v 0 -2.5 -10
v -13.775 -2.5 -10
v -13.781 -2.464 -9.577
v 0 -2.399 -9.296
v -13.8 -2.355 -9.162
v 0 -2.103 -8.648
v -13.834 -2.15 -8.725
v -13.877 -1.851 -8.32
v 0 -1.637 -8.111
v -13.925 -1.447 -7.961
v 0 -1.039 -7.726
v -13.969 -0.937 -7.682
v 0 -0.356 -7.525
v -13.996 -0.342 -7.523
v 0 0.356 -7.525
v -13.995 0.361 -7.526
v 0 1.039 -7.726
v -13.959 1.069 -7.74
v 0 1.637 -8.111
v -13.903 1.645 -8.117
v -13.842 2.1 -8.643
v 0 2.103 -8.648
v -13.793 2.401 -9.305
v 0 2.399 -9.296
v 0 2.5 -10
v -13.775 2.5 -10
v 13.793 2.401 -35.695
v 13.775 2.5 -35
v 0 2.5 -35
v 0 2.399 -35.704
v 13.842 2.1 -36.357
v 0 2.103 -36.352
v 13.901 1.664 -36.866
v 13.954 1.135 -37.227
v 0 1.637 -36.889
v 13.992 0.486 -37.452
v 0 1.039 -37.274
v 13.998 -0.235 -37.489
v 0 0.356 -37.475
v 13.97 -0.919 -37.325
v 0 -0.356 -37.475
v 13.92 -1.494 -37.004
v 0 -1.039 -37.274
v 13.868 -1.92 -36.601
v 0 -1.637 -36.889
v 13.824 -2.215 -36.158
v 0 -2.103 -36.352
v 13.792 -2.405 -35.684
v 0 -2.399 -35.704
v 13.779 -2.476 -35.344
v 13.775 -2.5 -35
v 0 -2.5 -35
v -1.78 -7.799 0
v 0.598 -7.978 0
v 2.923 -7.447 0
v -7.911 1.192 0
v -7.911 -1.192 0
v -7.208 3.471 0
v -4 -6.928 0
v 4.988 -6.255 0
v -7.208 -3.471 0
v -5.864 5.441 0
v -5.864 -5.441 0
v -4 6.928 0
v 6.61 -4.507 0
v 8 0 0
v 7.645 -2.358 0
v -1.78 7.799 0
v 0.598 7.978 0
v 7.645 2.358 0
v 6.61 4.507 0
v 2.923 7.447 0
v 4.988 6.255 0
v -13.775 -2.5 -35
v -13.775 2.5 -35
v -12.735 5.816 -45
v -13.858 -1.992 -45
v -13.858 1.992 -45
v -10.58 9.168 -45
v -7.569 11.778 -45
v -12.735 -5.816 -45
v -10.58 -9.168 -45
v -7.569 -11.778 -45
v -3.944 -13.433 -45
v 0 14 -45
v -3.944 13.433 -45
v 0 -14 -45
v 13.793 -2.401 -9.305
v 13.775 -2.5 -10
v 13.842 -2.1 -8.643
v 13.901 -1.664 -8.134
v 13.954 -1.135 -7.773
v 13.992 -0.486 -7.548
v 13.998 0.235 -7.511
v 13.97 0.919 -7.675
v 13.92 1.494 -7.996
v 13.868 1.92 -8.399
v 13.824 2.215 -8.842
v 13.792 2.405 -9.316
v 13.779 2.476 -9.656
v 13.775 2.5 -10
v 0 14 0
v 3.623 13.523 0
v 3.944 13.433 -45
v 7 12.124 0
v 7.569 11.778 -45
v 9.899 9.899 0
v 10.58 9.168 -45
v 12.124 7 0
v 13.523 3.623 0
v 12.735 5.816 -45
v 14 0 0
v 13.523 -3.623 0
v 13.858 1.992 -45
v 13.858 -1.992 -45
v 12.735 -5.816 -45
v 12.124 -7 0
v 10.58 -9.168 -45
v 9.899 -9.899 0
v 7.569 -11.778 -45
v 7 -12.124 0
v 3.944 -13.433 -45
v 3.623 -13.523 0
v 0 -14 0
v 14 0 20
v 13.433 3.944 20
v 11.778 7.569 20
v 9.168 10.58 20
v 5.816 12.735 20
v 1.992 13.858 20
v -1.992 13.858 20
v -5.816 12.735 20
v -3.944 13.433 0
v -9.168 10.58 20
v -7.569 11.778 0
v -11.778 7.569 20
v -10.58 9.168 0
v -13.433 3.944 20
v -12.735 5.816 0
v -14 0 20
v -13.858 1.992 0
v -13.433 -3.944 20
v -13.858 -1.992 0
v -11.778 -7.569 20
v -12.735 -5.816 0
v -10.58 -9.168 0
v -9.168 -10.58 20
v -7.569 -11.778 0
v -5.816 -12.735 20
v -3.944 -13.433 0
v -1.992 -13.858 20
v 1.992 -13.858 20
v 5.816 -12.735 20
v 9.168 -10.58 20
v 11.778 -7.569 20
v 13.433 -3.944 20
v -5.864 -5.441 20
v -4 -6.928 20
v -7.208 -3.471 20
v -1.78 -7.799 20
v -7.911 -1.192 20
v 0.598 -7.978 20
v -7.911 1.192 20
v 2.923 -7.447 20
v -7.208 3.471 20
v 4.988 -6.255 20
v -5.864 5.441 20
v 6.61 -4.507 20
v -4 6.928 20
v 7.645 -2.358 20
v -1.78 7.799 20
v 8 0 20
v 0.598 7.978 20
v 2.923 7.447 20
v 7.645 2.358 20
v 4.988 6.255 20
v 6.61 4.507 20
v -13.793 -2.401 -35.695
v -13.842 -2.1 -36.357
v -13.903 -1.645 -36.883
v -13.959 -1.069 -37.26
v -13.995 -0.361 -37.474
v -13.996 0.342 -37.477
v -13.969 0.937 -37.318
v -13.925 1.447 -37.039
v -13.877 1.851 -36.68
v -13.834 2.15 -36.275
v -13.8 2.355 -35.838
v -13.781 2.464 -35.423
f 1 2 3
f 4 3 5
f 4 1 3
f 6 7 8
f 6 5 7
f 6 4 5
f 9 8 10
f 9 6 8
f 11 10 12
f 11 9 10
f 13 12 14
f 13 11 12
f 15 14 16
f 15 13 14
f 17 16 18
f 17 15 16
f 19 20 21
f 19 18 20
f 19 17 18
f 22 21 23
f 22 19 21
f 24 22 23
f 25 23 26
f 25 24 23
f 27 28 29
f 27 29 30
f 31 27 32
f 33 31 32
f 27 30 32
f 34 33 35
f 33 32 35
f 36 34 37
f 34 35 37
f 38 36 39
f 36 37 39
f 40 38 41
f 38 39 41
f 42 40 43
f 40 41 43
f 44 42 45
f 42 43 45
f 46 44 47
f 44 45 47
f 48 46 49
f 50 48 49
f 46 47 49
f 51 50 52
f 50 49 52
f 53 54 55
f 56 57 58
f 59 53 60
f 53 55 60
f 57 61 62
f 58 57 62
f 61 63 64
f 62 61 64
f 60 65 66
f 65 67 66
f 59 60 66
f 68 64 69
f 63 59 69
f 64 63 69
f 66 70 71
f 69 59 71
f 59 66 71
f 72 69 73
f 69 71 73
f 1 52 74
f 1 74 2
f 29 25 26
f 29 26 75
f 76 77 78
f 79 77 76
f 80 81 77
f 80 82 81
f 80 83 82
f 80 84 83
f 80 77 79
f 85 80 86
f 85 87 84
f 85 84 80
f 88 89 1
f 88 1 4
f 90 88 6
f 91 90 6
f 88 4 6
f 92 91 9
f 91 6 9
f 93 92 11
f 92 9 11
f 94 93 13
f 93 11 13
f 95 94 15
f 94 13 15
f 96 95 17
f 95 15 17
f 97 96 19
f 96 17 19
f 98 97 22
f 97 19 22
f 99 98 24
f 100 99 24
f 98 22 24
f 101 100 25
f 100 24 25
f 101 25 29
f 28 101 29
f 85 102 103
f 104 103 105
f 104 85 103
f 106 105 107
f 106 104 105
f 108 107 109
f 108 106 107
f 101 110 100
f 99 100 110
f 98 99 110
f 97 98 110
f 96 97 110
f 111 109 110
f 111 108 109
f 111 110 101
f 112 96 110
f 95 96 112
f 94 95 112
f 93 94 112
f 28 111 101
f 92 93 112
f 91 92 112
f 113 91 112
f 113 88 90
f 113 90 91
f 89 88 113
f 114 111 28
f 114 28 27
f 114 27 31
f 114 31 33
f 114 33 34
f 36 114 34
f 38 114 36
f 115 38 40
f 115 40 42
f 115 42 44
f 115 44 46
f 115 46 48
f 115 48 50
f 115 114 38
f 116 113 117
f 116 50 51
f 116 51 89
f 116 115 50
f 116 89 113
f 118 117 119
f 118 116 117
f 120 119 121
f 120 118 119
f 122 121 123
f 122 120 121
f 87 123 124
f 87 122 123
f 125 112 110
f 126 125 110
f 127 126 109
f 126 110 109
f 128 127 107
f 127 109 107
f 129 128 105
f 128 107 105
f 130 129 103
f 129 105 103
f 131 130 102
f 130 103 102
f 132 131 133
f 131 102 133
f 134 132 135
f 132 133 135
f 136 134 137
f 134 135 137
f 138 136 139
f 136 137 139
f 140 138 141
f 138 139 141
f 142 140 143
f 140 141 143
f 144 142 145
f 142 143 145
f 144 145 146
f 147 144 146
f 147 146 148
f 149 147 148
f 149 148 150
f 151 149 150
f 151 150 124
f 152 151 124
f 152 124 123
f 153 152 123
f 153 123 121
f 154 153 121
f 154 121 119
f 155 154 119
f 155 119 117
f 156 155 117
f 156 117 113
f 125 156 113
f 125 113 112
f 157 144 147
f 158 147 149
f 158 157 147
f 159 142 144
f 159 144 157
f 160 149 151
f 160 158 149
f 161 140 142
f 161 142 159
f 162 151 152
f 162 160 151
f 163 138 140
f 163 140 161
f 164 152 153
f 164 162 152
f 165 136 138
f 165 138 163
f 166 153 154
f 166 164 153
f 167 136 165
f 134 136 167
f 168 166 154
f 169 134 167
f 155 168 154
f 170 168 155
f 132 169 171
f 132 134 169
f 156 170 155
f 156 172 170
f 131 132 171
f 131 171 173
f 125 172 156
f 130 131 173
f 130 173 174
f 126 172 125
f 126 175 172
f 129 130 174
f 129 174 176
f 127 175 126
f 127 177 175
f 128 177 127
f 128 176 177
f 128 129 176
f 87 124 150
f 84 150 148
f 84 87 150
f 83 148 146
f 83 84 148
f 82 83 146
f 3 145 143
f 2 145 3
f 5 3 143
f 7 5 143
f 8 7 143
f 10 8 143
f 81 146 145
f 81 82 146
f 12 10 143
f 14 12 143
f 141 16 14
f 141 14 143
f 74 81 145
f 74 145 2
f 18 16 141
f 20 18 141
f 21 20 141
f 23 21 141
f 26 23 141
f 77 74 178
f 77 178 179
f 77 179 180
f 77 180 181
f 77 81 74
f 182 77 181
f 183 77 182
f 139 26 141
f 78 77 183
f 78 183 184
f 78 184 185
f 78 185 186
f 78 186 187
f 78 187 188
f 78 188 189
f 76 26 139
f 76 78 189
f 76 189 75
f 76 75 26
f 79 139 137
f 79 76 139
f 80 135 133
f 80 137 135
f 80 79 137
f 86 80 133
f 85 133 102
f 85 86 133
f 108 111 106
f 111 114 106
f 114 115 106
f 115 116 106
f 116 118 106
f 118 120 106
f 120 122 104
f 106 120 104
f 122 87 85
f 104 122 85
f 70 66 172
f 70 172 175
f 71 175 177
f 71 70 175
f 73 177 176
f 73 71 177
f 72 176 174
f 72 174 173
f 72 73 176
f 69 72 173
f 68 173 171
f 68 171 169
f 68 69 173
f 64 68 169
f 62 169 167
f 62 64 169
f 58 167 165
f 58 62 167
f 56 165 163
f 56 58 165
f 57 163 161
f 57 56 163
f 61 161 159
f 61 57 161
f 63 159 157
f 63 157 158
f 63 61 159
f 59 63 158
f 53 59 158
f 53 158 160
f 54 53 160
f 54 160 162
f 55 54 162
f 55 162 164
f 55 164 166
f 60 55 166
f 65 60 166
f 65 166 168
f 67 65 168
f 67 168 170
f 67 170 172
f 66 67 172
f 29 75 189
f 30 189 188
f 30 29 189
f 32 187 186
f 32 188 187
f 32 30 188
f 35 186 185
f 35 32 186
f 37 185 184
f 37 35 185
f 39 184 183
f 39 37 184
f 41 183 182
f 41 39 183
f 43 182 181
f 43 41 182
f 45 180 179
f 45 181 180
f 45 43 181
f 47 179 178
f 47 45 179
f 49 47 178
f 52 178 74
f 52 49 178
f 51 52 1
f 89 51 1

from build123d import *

# Parameters (mm, degrees)
SCHIZZO1_R                                    = 14
SCHIZZO1_R_2                                  = 8
ESTRUSIONE_ESTRUSIONE1_DEPTH                  = 20
ESTRUSIONE_ESTRUSIONE2_REACH                  = 30.142
ESTRUSIONE_ESTRUSIONE2_END_RADIUS             = 14
SCHIZZO2_W                                    = 45
SCHIZZO2_H                                    = 28
ESTRUSIONE_ESTRUSIONE2_DIRECTION_2_REACH      = 30.142
ESTRUSIONE_ESTRUSIONE2_DIRECTION_2_END_RADIUS = 14


with BuildPart() as part:
    # Schizzo1 → Estrusione-Estrusione1 (new body)
    with BuildSketch(Plane.XY):
        Circle(SCHIZZO1_R)
        Circle(SCHIZZO1_R_2, mode=Mode.SUBTRACT)
    extrude(amount=ESTRUSIONE_ESTRUSIONE1_DEPTH)

    # Estrusione-Estrusione2: up to this cylinder (the profile starts inside it)
    estrusione_estrusione2_end = Plane(origin=(0, 0, -22.5), z_dir=(0, 0, -1)) * Cylinder(ESTRUSIONE_ESTRUSIONE2_END_RADIUS, 89.284, mode=Mode.PRIVATE)
    # Schizzo2 → Estrusione-Estrusione2 (add, up to the surface)
    with BuildSketch(Plane(origin=(0, 0, 0), x_dir=(0, 0, -1), z_dir=(1, 0, 0)), mode=Mode.PRIVATE) as estrusione_estrusione2_sk1:
        with Locations((22.5, 0)):
            Rectangle(SCHIZZO2_W, SCHIZZO2_H)
        with BuildLine():
            Line((35, -2.5), (10, -2.5))
            ThreePointArc((10, -2.5), (7.5, 0), (10, 2.5))
            Line((10, 2.5), (35, 2.5))
            ThreePointArc((35, 2.5), (37.5, 0), (35, -2.5))
        make_face(mode=Mode.SUBTRACT)
    estrusione_estrusione2_tool1 = extrude(estrusione_estrusione2_sk1.sketch, amount=ESTRUSIONE_ESTRUSIONE2_REACH, mode=Mode.PRIVATE) & estrusione_estrusione2_end
    add(estrusione_estrusione2_tool1.solids().sort_by_distance((0, -13.47, -22.5))[0])

    # Estrusione-Estrusione2 direction 2: up to this cylinder (the profile starts inside it)
    estrusione_estrusione2_direction_2_end = Plane(origin=(0, 0, -22.5), z_dir=(0, 0, -1)) * Cylinder(ESTRUSIONE_ESTRUSIONE2_DIRECTION_2_END_RADIUS, 89.284, mode=Mode.PRIVATE)
    # Schizzo2 → Estrusione-Estrusione2 direction 2 (add, up to the surface)
    with BuildSketch(Plane(origin=(0, 0, 0), x_dir=(0, 0, -1), z_dir=(1, 0, 0)), mode=Mode.PRIVATE) as estrusione_estrusione2_direction_2_sk1:
        with Locations((22.5, 0)):
            Rectangle(SCHIZZO2_W, SCHIZZO2_H)
        with BuildLine():
            Line((35, -2.5), (10, -2.5))
            ThreePointArc((10, -2.5), (7.5, 0), (10, 2.5))
            Line((10, 2.5), (35, 2.5))
            ThreePointArc((35, 2.5), (37.5, 0), (35, -2.5))
        make_face(mode=Mode.SUBTRACT)
    estrusione_estrusione2_direction_2_tool1 = extrude(estrusione_estrusione2_direction_2_sk1.sketch, amount=-ESTRUSIONE_ESTRUSIONE2_DIRECTION_2_REACH, mode=Mode.PRIVATE) & estrusione_estrusione2_direction_2_end
    add(estrusione_estrusione2_direction_2_tool1.solids().sort_by_distance((0, -13.47, -22.5))[0])


solid = part.part
